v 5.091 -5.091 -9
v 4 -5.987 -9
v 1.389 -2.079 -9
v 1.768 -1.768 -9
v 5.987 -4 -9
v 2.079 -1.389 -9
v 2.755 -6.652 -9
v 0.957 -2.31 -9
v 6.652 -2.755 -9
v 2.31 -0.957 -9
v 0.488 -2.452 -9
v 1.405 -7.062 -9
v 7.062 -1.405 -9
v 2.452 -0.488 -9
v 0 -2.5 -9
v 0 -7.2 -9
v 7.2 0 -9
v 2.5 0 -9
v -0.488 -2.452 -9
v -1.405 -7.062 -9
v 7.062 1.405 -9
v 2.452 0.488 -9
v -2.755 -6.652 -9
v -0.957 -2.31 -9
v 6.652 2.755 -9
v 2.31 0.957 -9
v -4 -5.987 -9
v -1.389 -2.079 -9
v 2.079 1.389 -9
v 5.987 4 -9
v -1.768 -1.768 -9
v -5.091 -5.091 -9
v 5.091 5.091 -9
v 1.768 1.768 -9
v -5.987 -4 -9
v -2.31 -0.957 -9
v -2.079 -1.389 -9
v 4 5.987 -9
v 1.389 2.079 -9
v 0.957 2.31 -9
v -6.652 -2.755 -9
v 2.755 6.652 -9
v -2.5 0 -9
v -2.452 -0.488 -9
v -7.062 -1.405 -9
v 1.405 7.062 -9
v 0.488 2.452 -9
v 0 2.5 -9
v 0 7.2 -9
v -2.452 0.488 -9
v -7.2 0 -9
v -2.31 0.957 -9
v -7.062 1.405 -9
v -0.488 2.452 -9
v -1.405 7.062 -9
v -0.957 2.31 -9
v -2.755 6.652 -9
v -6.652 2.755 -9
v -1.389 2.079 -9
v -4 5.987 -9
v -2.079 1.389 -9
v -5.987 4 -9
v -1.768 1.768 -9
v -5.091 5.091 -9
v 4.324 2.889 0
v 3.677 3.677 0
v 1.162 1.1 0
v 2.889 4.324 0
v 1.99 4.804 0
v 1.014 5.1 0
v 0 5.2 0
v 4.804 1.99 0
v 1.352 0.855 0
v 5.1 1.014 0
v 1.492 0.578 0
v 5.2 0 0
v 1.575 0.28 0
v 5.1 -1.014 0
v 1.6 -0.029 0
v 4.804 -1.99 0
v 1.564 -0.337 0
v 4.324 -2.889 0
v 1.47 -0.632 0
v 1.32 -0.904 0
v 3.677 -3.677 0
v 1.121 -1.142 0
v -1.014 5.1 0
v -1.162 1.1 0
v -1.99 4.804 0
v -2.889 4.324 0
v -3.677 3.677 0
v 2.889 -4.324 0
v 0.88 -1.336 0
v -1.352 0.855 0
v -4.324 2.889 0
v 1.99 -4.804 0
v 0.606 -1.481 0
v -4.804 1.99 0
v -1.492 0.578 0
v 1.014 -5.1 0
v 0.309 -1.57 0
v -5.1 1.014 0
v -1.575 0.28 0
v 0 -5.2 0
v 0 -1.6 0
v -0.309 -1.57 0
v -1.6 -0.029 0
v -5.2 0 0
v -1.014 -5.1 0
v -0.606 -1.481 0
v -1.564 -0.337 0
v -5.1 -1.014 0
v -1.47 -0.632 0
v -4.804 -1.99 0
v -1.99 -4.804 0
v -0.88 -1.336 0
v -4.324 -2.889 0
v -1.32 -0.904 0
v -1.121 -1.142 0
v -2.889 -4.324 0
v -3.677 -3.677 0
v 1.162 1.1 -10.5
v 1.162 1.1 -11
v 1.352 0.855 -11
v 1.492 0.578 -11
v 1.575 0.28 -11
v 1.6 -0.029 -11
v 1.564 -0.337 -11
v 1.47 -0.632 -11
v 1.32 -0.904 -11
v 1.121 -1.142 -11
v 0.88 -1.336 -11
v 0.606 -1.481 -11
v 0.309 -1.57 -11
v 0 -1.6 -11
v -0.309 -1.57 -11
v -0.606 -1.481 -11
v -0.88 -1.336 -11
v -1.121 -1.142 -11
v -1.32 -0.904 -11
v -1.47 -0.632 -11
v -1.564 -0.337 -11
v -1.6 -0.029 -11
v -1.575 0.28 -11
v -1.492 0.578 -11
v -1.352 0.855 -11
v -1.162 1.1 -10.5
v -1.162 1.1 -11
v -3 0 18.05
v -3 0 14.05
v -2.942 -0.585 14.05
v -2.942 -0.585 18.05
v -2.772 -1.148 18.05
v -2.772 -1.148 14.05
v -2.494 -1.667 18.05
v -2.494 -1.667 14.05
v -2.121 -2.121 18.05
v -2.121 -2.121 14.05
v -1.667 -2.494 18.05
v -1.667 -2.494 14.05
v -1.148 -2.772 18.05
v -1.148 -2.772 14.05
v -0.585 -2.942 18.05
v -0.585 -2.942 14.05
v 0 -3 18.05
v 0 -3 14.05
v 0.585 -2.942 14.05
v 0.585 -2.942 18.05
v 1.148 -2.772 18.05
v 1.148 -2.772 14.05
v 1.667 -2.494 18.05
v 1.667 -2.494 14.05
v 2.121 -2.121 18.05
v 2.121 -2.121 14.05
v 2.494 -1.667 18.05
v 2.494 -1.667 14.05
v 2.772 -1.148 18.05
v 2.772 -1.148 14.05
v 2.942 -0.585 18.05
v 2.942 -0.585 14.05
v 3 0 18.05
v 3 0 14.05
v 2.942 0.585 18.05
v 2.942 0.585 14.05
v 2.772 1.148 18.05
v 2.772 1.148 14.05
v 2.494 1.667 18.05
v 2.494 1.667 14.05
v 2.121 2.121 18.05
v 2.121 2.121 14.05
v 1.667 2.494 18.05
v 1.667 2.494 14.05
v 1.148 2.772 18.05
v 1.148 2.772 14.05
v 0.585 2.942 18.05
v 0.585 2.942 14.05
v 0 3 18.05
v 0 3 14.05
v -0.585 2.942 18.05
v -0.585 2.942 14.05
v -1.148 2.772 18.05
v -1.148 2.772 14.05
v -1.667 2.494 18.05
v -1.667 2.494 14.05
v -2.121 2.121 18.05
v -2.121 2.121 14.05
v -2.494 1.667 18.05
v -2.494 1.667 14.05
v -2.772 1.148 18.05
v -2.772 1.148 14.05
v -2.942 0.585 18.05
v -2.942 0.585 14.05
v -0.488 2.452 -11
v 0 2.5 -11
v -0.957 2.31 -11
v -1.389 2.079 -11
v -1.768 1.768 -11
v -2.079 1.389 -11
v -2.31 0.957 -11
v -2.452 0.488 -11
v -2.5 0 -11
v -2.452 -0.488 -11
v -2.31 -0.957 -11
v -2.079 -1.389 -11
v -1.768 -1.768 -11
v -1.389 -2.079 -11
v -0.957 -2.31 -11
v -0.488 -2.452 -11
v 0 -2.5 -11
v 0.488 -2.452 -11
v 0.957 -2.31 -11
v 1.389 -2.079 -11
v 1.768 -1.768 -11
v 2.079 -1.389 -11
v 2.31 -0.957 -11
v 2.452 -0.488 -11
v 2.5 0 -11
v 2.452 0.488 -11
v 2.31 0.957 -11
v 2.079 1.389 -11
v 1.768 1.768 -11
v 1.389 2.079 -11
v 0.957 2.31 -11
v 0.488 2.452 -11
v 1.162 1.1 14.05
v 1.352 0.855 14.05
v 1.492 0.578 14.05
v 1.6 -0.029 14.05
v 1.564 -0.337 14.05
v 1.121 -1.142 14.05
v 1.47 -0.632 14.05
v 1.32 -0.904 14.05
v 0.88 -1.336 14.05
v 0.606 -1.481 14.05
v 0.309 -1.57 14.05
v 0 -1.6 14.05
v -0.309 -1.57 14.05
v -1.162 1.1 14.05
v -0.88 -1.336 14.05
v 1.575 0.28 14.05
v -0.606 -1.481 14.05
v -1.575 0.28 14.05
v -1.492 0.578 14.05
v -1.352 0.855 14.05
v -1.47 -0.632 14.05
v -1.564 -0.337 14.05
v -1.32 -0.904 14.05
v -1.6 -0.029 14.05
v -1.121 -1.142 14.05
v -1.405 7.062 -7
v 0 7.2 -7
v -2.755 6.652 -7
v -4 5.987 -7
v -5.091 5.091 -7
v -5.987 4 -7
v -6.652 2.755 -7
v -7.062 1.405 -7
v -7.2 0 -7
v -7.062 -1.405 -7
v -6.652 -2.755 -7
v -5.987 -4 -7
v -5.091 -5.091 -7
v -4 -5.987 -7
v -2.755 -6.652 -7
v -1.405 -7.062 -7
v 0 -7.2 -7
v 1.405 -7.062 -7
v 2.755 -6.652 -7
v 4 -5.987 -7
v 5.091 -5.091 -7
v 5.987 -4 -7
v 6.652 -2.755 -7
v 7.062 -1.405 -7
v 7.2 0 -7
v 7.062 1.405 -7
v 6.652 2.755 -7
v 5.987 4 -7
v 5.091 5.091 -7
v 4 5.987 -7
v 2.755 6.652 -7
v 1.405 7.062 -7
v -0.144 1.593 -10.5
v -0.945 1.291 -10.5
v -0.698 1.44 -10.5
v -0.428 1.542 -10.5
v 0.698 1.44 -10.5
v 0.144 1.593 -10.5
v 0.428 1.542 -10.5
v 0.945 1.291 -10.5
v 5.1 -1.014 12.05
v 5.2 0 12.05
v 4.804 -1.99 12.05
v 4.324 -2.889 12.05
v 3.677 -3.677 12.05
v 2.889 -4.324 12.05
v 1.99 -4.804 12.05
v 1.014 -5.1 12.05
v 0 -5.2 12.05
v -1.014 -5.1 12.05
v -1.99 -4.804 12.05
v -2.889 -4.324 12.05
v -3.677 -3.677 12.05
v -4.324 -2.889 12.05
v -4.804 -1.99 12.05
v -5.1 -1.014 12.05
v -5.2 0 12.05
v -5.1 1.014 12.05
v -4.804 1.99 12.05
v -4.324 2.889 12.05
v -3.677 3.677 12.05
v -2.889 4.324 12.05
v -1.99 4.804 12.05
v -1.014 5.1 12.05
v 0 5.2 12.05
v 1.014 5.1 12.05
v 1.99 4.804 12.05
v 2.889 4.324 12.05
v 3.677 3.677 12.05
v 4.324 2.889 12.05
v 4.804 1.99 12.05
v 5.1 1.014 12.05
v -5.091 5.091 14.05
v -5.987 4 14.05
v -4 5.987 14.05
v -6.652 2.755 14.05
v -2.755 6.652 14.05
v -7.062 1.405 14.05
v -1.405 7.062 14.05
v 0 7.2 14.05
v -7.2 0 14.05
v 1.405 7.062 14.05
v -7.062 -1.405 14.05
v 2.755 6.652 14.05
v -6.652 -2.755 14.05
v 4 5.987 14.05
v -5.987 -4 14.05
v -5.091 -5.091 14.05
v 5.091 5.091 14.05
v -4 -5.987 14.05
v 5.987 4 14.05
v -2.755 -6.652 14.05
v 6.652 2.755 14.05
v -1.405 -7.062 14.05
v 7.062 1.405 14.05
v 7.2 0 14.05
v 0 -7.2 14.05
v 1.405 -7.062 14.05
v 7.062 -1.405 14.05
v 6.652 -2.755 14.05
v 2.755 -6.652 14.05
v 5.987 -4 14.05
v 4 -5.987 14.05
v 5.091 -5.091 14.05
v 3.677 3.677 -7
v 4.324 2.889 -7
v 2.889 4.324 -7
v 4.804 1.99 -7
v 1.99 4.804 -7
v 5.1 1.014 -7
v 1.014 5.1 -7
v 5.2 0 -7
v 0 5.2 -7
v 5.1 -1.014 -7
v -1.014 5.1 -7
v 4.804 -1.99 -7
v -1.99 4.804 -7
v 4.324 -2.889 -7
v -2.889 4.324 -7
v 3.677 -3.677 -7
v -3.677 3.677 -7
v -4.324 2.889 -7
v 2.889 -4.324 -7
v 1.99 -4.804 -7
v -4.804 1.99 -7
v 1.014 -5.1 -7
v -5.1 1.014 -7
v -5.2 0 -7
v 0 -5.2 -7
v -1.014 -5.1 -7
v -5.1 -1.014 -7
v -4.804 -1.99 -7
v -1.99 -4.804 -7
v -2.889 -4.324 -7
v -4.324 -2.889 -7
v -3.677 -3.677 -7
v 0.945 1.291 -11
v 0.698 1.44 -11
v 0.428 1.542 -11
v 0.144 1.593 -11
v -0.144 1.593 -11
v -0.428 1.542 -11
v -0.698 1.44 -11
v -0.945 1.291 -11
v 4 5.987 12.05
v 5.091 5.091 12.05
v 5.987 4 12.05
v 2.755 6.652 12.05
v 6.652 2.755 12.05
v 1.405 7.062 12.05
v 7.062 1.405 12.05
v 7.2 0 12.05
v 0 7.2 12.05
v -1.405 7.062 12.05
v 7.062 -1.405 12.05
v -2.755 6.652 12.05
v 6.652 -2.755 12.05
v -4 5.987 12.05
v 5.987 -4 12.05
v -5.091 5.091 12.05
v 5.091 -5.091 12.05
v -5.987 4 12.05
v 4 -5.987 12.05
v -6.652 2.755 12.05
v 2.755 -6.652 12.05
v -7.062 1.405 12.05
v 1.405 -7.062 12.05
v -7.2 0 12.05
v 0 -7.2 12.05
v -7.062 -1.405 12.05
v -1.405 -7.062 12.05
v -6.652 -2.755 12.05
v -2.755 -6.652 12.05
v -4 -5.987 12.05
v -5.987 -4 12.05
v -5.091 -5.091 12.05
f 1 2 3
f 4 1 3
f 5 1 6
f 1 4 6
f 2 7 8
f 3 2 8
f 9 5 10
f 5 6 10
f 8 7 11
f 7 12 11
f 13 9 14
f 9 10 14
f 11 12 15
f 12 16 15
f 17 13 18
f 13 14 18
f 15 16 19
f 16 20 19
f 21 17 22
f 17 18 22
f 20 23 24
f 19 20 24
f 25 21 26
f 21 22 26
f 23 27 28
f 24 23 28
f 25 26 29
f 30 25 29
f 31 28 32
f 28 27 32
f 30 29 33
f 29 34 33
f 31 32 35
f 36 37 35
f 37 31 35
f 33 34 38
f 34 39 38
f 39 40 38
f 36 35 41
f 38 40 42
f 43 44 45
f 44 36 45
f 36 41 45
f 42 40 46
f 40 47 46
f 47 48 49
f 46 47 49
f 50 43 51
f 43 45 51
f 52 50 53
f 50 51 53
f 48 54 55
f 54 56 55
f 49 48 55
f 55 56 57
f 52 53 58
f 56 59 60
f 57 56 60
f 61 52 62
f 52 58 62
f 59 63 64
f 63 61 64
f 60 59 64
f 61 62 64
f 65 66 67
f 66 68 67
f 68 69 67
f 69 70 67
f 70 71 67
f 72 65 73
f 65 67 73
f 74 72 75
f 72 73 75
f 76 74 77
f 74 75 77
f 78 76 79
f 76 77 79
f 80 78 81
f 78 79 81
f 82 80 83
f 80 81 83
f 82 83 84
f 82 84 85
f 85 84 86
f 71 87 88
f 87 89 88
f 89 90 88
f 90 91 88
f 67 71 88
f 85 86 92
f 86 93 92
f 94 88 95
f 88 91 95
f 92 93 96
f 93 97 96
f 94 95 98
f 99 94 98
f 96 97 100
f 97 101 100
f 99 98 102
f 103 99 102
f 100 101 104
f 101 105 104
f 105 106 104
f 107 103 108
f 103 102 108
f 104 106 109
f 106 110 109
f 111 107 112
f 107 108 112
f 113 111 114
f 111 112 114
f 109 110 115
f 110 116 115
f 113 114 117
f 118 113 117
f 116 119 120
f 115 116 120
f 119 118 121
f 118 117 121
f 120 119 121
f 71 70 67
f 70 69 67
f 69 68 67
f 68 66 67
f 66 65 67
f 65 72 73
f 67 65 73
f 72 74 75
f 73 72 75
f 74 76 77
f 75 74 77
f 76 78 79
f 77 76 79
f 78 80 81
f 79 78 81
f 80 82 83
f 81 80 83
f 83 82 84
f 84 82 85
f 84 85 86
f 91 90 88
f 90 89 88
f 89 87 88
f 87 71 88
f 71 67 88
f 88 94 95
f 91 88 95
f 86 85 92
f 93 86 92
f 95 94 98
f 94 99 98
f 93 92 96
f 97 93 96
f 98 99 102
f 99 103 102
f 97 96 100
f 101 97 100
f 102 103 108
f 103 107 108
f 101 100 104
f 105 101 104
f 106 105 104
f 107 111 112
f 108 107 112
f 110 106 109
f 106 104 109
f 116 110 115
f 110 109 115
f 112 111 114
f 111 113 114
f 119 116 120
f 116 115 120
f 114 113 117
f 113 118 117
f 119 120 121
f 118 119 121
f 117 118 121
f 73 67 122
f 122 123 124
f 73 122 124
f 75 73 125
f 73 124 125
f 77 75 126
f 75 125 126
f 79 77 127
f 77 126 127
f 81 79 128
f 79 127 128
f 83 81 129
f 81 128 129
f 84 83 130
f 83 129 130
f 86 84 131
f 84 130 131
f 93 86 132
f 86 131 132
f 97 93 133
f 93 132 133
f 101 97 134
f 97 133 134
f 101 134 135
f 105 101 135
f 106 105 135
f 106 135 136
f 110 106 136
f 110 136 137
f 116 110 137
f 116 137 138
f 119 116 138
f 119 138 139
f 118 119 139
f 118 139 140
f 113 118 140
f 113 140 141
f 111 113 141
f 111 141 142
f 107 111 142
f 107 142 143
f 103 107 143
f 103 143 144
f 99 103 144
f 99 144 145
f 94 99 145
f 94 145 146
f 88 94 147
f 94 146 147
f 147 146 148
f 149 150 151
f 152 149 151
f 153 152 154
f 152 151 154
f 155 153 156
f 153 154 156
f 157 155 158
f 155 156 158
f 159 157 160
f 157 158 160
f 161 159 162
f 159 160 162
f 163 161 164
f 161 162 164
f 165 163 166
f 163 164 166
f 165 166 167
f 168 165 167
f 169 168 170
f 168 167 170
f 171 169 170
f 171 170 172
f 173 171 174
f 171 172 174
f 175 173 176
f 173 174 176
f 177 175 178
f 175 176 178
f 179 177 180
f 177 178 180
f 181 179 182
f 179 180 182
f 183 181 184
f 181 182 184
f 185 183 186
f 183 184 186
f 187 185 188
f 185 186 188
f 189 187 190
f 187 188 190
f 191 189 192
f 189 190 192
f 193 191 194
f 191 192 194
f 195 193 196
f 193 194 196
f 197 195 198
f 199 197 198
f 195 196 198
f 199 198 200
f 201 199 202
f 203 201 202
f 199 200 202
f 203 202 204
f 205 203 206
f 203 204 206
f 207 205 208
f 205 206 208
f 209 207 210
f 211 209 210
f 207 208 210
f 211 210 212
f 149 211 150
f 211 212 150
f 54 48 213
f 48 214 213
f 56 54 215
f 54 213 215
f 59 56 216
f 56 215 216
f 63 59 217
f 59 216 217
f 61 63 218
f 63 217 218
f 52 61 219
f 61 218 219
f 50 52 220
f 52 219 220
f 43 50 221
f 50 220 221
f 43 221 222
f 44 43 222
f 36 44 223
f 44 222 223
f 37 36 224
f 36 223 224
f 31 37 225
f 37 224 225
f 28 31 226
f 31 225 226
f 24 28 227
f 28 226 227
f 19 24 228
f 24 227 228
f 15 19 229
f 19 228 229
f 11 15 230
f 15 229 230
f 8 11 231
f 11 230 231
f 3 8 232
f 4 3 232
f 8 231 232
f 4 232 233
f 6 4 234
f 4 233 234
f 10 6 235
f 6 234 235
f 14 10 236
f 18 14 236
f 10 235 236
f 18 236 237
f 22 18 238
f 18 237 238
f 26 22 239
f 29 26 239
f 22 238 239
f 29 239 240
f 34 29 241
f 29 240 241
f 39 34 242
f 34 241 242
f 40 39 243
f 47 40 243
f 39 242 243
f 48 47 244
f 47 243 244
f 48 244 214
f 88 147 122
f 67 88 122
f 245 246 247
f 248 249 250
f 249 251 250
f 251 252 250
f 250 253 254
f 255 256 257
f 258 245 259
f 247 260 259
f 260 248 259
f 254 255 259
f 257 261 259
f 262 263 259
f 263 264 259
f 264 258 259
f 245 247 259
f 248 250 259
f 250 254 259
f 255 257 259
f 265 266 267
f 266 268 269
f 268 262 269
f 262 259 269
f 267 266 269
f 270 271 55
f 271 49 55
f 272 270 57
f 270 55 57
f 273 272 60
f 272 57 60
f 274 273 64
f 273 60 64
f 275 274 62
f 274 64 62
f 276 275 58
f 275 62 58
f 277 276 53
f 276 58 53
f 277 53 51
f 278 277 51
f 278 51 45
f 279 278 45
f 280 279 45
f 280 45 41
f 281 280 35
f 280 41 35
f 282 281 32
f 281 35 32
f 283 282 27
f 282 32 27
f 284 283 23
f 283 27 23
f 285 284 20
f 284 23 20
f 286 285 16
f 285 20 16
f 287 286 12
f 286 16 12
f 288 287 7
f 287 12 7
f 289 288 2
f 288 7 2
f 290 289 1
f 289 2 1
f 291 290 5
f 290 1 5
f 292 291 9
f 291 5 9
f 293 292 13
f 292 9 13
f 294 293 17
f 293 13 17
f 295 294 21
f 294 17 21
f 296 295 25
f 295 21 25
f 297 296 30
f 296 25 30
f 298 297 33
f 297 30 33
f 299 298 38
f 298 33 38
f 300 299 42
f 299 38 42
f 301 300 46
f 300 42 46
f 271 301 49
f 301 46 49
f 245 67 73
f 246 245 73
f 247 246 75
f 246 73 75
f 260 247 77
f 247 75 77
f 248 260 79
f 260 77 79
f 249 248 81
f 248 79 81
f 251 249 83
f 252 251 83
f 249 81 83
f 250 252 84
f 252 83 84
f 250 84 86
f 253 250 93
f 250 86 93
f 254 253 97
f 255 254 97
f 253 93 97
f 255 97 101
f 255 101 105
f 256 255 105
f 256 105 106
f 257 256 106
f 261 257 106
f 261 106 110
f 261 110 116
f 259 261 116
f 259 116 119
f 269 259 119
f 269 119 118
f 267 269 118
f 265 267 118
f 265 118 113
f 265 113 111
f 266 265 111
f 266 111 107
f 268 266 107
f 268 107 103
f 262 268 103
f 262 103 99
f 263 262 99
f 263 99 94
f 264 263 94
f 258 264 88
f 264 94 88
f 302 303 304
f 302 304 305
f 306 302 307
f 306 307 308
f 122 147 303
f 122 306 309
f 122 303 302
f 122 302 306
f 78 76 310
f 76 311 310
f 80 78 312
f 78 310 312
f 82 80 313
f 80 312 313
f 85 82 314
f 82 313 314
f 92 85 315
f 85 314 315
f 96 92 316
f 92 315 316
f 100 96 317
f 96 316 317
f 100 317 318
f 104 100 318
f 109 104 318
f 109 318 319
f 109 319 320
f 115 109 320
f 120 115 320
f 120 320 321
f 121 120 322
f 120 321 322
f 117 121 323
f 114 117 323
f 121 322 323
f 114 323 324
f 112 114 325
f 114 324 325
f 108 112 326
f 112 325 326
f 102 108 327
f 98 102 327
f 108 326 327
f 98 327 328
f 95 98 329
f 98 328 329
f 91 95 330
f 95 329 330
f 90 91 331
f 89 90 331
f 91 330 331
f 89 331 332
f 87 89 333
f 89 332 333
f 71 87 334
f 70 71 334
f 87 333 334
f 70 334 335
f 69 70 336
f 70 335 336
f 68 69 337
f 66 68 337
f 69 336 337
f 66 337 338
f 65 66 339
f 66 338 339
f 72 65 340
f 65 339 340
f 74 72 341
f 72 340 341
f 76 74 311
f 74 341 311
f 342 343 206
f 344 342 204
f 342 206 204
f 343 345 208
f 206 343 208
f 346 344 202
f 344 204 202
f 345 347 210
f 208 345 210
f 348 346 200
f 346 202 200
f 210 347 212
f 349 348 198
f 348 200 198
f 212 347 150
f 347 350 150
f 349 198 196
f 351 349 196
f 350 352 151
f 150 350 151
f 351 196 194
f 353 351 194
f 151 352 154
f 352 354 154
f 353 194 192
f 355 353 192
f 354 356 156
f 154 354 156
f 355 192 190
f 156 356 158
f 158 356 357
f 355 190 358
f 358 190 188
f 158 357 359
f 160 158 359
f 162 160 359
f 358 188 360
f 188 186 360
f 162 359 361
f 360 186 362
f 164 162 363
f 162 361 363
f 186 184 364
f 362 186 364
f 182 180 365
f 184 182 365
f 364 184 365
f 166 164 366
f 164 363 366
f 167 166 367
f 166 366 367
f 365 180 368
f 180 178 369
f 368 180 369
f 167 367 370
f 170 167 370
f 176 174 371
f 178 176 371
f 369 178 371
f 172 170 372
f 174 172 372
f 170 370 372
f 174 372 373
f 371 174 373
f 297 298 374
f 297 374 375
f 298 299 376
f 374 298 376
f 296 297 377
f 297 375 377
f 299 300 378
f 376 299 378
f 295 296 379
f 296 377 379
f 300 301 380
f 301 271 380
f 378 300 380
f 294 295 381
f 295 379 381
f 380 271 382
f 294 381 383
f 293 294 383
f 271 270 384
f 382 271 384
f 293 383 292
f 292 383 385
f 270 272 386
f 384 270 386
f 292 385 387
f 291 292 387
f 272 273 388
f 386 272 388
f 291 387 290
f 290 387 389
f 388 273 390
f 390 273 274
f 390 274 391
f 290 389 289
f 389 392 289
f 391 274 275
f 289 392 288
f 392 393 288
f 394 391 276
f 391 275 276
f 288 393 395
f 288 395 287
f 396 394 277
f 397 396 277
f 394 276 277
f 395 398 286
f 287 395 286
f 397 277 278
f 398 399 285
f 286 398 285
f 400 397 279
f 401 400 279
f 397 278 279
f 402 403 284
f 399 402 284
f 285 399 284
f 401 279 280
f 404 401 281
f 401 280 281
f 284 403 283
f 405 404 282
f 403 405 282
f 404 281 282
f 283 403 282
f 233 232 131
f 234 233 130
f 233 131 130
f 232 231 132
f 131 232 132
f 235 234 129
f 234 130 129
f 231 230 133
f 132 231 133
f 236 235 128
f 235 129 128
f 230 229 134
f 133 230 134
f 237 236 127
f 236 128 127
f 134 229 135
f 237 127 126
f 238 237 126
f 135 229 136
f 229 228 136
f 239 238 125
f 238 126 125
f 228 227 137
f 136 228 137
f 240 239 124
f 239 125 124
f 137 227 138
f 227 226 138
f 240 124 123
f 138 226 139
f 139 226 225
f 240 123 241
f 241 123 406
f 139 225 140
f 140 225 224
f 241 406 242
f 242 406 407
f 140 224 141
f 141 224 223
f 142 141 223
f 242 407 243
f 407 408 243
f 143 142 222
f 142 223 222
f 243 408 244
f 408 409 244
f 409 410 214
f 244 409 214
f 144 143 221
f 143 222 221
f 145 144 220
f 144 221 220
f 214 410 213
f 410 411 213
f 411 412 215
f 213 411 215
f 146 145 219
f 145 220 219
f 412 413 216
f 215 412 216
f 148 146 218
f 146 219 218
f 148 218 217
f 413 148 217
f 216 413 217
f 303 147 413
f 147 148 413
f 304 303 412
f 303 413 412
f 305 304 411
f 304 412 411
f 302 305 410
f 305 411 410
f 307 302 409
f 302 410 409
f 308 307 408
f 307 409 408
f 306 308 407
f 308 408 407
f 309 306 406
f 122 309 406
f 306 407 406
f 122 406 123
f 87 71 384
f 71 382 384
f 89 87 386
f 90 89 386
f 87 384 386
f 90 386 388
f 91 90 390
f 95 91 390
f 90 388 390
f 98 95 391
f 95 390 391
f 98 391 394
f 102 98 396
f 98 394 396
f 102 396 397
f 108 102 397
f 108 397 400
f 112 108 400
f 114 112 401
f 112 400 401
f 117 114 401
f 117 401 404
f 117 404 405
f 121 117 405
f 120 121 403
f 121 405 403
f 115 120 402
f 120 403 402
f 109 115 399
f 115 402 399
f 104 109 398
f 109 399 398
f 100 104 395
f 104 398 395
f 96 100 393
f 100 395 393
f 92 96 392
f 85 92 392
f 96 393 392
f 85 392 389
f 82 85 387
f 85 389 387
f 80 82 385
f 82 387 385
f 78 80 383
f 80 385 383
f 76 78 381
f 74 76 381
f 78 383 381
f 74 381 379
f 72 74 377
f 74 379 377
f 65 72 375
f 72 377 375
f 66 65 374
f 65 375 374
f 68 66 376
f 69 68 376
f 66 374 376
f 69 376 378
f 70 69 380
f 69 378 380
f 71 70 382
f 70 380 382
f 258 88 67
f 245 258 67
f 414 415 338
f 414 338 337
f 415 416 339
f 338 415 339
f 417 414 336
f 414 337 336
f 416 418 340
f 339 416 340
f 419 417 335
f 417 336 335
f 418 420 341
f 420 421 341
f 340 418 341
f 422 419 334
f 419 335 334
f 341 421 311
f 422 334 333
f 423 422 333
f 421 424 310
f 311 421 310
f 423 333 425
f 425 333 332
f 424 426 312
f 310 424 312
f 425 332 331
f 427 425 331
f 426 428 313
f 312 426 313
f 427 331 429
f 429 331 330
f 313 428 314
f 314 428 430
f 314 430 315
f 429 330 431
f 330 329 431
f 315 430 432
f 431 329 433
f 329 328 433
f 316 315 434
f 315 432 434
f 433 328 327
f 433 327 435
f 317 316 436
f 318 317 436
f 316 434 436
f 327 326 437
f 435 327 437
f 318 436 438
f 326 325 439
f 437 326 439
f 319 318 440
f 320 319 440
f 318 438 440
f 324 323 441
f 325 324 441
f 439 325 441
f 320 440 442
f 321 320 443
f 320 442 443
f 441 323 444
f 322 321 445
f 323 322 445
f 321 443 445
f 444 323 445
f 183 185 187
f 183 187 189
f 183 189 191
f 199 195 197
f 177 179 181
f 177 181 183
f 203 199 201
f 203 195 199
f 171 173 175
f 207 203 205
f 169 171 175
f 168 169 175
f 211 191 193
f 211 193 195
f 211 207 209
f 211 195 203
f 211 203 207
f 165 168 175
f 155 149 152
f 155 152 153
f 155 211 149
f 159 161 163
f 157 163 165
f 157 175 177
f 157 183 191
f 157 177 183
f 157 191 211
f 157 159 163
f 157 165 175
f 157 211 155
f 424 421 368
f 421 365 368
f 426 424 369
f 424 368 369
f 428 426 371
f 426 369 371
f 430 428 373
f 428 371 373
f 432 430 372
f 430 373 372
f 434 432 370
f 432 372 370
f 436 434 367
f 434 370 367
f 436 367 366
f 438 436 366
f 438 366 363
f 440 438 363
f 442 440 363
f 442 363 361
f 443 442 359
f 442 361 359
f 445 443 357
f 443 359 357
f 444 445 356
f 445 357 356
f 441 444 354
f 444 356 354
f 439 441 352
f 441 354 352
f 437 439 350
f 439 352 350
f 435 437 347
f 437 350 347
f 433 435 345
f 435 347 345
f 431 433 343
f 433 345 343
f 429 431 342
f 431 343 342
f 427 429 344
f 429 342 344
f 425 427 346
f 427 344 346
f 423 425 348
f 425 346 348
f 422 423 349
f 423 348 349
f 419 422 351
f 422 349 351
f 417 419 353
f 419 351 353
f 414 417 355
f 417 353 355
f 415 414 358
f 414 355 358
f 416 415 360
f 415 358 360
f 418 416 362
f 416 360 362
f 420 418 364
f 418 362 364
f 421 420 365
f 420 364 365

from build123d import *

# Parameters (mm, degrees)
SKETCH4_R               = 1.6
CUT_EXTRUDE2_DEPTH      = 0.5
CUT_EXTRUDE1_DEPTH      = 18.35172902
CUT_EXTRUDE1_DEPTH_BACK = 18.35172902
SKETCH6_R               = 3
BOSS_EXTRUDE2_DEPTH     = 4


with BuildPart() as part:
    # Sketch2 → Revolve1 (revolve)
    with BuildSketch(Plane(origin=(0, 0, 0), x_dir=(0, 0, -1), z_dir=(1, 0, 0))):
        Polygon((0, 0), (0, 5.2), (7, 5.2), (7, 7.2), (9, 7.2), (9, 2.5), (11, 2.5), (11, 0), align=None)
    revolve(axis=Axis((0, 0, -11), (0, 0, 1)))

    # Sketch4 → Cut-Extrude2 (cut)
    with BuildSketch(Plane(origin=(0, 0, -11), x_dir=(-1, 0, 0), z_dir=(0, 0, -1))):
        with Locations(Location((0, 0, 0), (0, 0, 90))):
            Circle(SKETCH4_R)
    extrude(amount=-CUT_EXTRUDE2_DEPTH, mode=Mode.SUBTRACT)


with BuildPart() as body_2:
    # Sketch5 → Revolve2 (revolve)
    with BuildSketch(Plane(origin=(0, 0, 0), x_dir=(0, 0, -1), z_dir=(1, 0, 0)), mode=Mode.PRIVATE) as revolve2_sk:
        Polygon((0, 0), (0, 5.2), (-12.05, 5.2), (-12.05, 7.2), (-14.05, 7.2), (-14.05, 0), align=None)
    revolve(revolve2_sk.sketch.rotate(Axis((0, 0, 14.05), (0, 0, -1)), 90), axis=Axis((0, 0, 14.05), (0, 0, -1)))


with BuildPart() as cut_extrude1_tool:
    # Sketch3 → Cut-Extrude1 (new, two sides: drawn at the far end of the back side and taken through both)
    with BuildSketch(Plane.XY.offset(-CUT_EXTRUDE1_DEPTH_BACK)):
        with BuildLine():
            Line((-1.161895004, 1.1), (1.161895004, 1.1))
            ThreePointArc((1.161895004, 1.1), (0, -1.6), (-1.161895004, 1.1))
        make_face()
    extrude(amount=CUT_EXTRUDE1_DEPTH + CUT_EXTRUDE1_DEPTH_BACK)


with BuildPart() as part_1:
    add(part.part)

    # Cut-Extrude1: cut by cut_extrude1_tool
    add(cut_extrude1_tool.part, mode=Mode.SUBTRACT)


with BuildPart() as body_2_1:
    add(body_2.part)

    # Cut-Extrude1: cut by cut_extrude1_tool
    add(cut_extrude1_tool.part, mode=Mode.SUBTRACT)

    # Sketch6 → Boss-Extrude2 (add)
    with BuildSketch(Plane.XY.offset(14.05)):
        with Locations(Location((0, 0, 0), (0, 0, 180))):
            Circle(SKETCH6_R)
    extrude(amount=BOSS_EXTRUDE2_DEPTH)


solid = Compound([part_1.part, body_2_1.part])
